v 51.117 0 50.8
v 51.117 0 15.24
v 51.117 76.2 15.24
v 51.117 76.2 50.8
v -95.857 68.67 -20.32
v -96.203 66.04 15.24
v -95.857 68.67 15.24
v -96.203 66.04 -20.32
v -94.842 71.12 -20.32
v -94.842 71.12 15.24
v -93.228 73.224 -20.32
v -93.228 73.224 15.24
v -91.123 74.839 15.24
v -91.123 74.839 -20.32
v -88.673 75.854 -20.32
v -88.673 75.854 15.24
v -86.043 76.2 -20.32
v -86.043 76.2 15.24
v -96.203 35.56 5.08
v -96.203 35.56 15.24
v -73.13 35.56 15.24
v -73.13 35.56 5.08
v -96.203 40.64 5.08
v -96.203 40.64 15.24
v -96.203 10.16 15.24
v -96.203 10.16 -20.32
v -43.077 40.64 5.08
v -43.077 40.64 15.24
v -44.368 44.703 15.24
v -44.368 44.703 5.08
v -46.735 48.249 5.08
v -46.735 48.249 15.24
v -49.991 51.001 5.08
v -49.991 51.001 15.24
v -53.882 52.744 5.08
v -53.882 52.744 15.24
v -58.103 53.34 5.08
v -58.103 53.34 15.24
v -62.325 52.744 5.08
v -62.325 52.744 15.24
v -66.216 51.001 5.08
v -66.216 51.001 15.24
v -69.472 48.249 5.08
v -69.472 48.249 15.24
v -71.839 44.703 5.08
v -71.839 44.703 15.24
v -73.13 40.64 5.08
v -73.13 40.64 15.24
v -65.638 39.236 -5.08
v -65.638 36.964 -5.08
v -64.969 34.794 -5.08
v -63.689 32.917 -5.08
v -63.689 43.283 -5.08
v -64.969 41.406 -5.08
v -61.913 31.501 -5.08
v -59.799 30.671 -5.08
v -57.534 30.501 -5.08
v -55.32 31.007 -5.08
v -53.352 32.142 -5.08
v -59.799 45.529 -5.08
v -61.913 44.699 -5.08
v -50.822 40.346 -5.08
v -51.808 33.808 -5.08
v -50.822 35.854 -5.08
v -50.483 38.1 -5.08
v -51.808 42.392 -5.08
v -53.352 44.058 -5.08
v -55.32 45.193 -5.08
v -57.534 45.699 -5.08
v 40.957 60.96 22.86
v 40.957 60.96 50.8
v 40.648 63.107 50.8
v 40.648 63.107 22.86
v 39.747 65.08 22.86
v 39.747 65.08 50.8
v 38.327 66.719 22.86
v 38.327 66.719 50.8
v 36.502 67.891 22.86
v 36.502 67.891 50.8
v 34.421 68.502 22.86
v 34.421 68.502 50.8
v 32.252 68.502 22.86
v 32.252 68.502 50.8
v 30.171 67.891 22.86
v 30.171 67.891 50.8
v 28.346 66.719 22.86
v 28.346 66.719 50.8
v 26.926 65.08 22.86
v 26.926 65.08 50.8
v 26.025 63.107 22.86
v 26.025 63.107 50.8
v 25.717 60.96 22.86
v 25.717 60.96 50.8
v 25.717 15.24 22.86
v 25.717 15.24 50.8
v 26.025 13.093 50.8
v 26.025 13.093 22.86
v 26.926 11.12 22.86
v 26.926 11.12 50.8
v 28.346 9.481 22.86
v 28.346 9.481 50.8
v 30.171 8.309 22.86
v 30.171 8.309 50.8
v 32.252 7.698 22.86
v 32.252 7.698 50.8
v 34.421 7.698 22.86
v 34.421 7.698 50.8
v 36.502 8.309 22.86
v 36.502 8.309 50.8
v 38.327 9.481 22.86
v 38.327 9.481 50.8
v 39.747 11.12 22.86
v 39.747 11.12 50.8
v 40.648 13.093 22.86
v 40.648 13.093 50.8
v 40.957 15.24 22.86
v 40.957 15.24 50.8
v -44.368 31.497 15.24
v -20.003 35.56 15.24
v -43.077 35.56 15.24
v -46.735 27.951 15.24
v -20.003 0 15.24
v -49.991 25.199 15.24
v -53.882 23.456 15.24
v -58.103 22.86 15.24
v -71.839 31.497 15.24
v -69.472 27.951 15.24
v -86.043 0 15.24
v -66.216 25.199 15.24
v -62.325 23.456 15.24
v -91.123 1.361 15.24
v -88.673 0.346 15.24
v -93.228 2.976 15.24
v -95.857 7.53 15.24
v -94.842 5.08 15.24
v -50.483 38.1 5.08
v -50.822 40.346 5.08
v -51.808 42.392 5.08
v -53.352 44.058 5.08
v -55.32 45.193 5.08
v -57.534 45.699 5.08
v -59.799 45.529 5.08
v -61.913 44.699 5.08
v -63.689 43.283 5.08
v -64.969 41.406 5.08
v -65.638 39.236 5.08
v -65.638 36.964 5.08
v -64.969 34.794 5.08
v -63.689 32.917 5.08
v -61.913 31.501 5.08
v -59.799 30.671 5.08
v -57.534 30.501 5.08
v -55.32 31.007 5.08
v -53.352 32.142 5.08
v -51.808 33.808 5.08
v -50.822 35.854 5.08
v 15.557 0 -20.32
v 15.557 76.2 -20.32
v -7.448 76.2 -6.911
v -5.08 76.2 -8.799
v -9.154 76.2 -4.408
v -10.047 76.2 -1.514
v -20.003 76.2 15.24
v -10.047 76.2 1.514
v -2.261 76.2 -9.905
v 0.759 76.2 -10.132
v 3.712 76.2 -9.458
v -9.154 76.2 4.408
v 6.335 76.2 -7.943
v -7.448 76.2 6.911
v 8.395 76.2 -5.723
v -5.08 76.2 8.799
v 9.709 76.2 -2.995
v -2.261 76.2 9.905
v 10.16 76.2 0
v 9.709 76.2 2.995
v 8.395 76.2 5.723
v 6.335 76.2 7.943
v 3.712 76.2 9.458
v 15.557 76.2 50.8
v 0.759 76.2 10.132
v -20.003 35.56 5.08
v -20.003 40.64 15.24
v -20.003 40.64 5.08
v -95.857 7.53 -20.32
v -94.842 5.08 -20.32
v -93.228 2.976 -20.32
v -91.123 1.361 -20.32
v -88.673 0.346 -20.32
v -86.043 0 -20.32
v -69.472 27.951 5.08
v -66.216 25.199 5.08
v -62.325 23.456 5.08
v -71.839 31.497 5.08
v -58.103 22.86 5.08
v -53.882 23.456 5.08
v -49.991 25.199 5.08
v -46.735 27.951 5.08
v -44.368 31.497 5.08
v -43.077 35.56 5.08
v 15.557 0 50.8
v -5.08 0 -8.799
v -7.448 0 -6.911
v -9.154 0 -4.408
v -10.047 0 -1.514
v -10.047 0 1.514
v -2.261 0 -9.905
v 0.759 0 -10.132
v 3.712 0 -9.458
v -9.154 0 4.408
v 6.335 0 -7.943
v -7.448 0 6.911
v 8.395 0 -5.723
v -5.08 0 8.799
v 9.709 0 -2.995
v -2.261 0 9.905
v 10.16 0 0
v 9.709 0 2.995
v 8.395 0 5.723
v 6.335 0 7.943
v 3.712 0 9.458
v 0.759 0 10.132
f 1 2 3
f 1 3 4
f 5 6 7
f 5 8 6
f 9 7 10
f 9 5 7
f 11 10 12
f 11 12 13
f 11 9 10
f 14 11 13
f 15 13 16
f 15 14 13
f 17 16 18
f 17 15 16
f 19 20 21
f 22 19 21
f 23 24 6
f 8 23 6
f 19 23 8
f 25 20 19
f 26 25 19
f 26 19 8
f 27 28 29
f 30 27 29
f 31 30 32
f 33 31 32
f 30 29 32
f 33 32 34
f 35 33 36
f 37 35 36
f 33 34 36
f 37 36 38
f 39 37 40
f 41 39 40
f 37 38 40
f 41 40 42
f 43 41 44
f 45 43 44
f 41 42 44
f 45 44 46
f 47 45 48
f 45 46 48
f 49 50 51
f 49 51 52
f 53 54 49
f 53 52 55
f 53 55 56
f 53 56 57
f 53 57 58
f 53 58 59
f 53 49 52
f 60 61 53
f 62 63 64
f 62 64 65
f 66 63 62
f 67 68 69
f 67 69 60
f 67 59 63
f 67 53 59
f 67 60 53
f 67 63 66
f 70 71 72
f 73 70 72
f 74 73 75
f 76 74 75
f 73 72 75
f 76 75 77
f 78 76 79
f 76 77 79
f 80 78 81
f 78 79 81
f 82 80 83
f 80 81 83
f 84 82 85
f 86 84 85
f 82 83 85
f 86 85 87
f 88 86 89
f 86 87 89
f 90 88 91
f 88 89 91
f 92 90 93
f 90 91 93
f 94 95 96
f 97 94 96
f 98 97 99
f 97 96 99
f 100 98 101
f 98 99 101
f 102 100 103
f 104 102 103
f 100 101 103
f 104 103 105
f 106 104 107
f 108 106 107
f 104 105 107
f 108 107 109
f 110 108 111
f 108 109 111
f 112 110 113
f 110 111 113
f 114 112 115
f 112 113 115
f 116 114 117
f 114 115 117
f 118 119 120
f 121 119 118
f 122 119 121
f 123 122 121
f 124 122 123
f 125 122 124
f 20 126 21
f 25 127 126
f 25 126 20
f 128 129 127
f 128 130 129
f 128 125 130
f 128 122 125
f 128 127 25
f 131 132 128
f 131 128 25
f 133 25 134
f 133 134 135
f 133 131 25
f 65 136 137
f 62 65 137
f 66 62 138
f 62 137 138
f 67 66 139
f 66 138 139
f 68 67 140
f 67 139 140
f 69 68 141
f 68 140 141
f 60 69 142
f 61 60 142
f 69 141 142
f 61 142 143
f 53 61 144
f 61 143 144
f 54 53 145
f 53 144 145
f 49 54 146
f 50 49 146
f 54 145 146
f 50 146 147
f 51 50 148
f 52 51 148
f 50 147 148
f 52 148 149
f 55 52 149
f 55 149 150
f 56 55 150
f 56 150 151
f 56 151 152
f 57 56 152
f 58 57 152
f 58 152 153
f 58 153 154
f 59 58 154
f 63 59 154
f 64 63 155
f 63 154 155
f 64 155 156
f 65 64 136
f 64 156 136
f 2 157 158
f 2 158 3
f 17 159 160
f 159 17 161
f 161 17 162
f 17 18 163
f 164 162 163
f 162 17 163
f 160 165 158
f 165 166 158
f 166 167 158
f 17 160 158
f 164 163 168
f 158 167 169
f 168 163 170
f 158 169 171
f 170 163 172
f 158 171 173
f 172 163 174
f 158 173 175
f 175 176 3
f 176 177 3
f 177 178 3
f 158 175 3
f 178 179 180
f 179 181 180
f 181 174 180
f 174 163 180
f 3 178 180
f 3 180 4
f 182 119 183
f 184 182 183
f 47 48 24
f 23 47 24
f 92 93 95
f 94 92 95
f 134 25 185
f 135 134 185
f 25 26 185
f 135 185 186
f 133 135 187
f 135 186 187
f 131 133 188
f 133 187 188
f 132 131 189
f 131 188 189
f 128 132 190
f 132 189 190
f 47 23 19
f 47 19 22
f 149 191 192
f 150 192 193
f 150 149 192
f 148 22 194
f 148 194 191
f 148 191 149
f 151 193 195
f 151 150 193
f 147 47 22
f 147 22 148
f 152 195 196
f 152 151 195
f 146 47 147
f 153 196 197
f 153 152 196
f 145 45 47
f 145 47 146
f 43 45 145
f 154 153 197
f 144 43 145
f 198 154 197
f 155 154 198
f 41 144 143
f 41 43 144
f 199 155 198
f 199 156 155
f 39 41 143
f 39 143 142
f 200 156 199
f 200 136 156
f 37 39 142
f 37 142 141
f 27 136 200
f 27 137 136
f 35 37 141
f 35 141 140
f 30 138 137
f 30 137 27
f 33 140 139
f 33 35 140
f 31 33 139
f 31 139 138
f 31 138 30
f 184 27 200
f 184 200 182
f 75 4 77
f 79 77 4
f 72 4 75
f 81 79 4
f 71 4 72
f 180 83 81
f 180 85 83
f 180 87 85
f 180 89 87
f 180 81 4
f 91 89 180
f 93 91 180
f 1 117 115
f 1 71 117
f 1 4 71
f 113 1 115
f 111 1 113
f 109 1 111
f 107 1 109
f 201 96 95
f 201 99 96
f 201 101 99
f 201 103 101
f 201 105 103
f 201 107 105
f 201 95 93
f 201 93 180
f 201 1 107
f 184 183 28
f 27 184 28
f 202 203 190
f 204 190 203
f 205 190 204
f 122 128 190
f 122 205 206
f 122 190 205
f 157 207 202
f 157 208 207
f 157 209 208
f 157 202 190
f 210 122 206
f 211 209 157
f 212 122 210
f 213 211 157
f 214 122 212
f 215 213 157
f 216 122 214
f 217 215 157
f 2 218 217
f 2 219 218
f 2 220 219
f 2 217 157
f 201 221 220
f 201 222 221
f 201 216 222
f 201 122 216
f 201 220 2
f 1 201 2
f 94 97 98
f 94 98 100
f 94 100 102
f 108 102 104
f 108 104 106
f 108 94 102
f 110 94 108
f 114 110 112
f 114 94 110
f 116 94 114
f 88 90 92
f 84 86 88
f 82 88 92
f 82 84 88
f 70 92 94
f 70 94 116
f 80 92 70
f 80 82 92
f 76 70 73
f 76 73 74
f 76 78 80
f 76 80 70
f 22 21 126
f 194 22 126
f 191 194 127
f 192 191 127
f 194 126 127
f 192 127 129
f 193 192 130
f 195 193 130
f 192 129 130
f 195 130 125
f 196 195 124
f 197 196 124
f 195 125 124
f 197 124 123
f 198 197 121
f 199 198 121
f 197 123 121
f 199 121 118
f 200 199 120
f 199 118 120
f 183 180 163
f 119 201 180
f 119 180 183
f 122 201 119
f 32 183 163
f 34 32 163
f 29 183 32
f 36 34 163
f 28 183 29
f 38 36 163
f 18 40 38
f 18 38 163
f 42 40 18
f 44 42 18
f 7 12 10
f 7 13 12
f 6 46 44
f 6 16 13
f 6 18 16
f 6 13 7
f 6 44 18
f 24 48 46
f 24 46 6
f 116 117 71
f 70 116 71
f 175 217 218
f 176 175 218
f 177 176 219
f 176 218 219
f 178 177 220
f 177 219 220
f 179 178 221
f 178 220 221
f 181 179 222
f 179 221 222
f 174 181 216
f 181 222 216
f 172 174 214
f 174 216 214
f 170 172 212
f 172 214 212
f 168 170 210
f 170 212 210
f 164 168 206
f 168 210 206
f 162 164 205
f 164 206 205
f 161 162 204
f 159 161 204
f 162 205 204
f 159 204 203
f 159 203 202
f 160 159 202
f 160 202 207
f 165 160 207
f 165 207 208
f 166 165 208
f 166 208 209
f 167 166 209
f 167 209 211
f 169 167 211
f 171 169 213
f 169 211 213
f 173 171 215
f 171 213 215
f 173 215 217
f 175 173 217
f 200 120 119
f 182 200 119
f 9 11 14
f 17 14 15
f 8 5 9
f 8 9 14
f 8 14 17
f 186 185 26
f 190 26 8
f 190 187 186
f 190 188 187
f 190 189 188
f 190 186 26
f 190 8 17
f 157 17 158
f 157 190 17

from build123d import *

# Parameters (mm, degrees)
F0_R     = 10.16
F1_DEPTH = 76.2
F3_DEPTH = 27.94
F5_DEPTH = 10.16
F6_R     = 7.62
F7_DEPTH = 10.16
F8_R     = 10.16


with BuildPart() as f1:
    # F0 (on Front) → F1 (new body)
    with BuildSketch(Plane.XZ):
        Polygon((-96.203486, 15.24), (-96.203486, -20.32), (15.556514, -20.32), (51.116514, 15.24), (51.116514, 50.8), (15.556514, 50.8), (-20.003486, 15.24), align=None)
        Circle(F0_R, mode=Mode.SUBTRACT)
    extrude(amount=-F1_DEPTH)

    # F2 (on face) → F3 (cut)
    with BuildSketch(Plane.XY.offset(50.8)):
        with BuildLine():
            ThreePointArc((25.716514, 15.24), (33.336514, 7.62), (40.956514, 15.24))
            Line((40.956514, 15.24), (40.956514, 60.96))
            ThreePointArc((40.956514, 60.96), (33.336514, 68.58), (25.716514, 60.96))
            Line((25.716514, 60.96), (25.716514, 15.24))
        make_face()
    extrude(amount=-F3_DEPTH, mode=Mode.SUBTRACT)

    # F4 (on face) → F5 (cut)
    with BuildSketch(Plane.XY.offset(15.24)):
        with BuildLine():
            Line((-20.003486, 40.64), (-43.076643, 40.64))
            ThreePointArc((-43.076643, 40.64), (-58.103486, 53.34), (-73.130329, 40.64))
            Line((-73.130329, 40.64), (-96.203486, 40.64))
            Line((-96.203486, 40.64), (-96.203486, 35.56))
            Line((-96.203486, 35.56), (-73.130329, 35.56))
            ThreePointArc((-73.130329, 35.56), (-58.103486, 22.86), (-43.076643, 35.56))
            Line((-43.076643, 35.56), (-20.003486, 35.56))
            Line((-20.003486, 35.56), (-20.003486, 40.64))
        make_face()
    extrude(amount=-F5_DEPTH, mode=Mode.SUBTRACT)

    # F6 (on face) → F7 (cut)
    with BuildSketch(Plane.XY.offset(5.08)):
        with Locations((-58.103486, 38.1)):
            Circle(F6_R)
    extrude(amount=-F7_DEPTH, mode=Mode.SUBTRACT)

    # F8
    f8_edges = [f1.edges().sort_by_distance(p)[0] for p in [
        (-96.203486, 0, -2.54),
        (-96.203486, 76.2, -2.54),
    ]]
    fillet(f8_edges, radius=F8_R)


solid = f1.part
